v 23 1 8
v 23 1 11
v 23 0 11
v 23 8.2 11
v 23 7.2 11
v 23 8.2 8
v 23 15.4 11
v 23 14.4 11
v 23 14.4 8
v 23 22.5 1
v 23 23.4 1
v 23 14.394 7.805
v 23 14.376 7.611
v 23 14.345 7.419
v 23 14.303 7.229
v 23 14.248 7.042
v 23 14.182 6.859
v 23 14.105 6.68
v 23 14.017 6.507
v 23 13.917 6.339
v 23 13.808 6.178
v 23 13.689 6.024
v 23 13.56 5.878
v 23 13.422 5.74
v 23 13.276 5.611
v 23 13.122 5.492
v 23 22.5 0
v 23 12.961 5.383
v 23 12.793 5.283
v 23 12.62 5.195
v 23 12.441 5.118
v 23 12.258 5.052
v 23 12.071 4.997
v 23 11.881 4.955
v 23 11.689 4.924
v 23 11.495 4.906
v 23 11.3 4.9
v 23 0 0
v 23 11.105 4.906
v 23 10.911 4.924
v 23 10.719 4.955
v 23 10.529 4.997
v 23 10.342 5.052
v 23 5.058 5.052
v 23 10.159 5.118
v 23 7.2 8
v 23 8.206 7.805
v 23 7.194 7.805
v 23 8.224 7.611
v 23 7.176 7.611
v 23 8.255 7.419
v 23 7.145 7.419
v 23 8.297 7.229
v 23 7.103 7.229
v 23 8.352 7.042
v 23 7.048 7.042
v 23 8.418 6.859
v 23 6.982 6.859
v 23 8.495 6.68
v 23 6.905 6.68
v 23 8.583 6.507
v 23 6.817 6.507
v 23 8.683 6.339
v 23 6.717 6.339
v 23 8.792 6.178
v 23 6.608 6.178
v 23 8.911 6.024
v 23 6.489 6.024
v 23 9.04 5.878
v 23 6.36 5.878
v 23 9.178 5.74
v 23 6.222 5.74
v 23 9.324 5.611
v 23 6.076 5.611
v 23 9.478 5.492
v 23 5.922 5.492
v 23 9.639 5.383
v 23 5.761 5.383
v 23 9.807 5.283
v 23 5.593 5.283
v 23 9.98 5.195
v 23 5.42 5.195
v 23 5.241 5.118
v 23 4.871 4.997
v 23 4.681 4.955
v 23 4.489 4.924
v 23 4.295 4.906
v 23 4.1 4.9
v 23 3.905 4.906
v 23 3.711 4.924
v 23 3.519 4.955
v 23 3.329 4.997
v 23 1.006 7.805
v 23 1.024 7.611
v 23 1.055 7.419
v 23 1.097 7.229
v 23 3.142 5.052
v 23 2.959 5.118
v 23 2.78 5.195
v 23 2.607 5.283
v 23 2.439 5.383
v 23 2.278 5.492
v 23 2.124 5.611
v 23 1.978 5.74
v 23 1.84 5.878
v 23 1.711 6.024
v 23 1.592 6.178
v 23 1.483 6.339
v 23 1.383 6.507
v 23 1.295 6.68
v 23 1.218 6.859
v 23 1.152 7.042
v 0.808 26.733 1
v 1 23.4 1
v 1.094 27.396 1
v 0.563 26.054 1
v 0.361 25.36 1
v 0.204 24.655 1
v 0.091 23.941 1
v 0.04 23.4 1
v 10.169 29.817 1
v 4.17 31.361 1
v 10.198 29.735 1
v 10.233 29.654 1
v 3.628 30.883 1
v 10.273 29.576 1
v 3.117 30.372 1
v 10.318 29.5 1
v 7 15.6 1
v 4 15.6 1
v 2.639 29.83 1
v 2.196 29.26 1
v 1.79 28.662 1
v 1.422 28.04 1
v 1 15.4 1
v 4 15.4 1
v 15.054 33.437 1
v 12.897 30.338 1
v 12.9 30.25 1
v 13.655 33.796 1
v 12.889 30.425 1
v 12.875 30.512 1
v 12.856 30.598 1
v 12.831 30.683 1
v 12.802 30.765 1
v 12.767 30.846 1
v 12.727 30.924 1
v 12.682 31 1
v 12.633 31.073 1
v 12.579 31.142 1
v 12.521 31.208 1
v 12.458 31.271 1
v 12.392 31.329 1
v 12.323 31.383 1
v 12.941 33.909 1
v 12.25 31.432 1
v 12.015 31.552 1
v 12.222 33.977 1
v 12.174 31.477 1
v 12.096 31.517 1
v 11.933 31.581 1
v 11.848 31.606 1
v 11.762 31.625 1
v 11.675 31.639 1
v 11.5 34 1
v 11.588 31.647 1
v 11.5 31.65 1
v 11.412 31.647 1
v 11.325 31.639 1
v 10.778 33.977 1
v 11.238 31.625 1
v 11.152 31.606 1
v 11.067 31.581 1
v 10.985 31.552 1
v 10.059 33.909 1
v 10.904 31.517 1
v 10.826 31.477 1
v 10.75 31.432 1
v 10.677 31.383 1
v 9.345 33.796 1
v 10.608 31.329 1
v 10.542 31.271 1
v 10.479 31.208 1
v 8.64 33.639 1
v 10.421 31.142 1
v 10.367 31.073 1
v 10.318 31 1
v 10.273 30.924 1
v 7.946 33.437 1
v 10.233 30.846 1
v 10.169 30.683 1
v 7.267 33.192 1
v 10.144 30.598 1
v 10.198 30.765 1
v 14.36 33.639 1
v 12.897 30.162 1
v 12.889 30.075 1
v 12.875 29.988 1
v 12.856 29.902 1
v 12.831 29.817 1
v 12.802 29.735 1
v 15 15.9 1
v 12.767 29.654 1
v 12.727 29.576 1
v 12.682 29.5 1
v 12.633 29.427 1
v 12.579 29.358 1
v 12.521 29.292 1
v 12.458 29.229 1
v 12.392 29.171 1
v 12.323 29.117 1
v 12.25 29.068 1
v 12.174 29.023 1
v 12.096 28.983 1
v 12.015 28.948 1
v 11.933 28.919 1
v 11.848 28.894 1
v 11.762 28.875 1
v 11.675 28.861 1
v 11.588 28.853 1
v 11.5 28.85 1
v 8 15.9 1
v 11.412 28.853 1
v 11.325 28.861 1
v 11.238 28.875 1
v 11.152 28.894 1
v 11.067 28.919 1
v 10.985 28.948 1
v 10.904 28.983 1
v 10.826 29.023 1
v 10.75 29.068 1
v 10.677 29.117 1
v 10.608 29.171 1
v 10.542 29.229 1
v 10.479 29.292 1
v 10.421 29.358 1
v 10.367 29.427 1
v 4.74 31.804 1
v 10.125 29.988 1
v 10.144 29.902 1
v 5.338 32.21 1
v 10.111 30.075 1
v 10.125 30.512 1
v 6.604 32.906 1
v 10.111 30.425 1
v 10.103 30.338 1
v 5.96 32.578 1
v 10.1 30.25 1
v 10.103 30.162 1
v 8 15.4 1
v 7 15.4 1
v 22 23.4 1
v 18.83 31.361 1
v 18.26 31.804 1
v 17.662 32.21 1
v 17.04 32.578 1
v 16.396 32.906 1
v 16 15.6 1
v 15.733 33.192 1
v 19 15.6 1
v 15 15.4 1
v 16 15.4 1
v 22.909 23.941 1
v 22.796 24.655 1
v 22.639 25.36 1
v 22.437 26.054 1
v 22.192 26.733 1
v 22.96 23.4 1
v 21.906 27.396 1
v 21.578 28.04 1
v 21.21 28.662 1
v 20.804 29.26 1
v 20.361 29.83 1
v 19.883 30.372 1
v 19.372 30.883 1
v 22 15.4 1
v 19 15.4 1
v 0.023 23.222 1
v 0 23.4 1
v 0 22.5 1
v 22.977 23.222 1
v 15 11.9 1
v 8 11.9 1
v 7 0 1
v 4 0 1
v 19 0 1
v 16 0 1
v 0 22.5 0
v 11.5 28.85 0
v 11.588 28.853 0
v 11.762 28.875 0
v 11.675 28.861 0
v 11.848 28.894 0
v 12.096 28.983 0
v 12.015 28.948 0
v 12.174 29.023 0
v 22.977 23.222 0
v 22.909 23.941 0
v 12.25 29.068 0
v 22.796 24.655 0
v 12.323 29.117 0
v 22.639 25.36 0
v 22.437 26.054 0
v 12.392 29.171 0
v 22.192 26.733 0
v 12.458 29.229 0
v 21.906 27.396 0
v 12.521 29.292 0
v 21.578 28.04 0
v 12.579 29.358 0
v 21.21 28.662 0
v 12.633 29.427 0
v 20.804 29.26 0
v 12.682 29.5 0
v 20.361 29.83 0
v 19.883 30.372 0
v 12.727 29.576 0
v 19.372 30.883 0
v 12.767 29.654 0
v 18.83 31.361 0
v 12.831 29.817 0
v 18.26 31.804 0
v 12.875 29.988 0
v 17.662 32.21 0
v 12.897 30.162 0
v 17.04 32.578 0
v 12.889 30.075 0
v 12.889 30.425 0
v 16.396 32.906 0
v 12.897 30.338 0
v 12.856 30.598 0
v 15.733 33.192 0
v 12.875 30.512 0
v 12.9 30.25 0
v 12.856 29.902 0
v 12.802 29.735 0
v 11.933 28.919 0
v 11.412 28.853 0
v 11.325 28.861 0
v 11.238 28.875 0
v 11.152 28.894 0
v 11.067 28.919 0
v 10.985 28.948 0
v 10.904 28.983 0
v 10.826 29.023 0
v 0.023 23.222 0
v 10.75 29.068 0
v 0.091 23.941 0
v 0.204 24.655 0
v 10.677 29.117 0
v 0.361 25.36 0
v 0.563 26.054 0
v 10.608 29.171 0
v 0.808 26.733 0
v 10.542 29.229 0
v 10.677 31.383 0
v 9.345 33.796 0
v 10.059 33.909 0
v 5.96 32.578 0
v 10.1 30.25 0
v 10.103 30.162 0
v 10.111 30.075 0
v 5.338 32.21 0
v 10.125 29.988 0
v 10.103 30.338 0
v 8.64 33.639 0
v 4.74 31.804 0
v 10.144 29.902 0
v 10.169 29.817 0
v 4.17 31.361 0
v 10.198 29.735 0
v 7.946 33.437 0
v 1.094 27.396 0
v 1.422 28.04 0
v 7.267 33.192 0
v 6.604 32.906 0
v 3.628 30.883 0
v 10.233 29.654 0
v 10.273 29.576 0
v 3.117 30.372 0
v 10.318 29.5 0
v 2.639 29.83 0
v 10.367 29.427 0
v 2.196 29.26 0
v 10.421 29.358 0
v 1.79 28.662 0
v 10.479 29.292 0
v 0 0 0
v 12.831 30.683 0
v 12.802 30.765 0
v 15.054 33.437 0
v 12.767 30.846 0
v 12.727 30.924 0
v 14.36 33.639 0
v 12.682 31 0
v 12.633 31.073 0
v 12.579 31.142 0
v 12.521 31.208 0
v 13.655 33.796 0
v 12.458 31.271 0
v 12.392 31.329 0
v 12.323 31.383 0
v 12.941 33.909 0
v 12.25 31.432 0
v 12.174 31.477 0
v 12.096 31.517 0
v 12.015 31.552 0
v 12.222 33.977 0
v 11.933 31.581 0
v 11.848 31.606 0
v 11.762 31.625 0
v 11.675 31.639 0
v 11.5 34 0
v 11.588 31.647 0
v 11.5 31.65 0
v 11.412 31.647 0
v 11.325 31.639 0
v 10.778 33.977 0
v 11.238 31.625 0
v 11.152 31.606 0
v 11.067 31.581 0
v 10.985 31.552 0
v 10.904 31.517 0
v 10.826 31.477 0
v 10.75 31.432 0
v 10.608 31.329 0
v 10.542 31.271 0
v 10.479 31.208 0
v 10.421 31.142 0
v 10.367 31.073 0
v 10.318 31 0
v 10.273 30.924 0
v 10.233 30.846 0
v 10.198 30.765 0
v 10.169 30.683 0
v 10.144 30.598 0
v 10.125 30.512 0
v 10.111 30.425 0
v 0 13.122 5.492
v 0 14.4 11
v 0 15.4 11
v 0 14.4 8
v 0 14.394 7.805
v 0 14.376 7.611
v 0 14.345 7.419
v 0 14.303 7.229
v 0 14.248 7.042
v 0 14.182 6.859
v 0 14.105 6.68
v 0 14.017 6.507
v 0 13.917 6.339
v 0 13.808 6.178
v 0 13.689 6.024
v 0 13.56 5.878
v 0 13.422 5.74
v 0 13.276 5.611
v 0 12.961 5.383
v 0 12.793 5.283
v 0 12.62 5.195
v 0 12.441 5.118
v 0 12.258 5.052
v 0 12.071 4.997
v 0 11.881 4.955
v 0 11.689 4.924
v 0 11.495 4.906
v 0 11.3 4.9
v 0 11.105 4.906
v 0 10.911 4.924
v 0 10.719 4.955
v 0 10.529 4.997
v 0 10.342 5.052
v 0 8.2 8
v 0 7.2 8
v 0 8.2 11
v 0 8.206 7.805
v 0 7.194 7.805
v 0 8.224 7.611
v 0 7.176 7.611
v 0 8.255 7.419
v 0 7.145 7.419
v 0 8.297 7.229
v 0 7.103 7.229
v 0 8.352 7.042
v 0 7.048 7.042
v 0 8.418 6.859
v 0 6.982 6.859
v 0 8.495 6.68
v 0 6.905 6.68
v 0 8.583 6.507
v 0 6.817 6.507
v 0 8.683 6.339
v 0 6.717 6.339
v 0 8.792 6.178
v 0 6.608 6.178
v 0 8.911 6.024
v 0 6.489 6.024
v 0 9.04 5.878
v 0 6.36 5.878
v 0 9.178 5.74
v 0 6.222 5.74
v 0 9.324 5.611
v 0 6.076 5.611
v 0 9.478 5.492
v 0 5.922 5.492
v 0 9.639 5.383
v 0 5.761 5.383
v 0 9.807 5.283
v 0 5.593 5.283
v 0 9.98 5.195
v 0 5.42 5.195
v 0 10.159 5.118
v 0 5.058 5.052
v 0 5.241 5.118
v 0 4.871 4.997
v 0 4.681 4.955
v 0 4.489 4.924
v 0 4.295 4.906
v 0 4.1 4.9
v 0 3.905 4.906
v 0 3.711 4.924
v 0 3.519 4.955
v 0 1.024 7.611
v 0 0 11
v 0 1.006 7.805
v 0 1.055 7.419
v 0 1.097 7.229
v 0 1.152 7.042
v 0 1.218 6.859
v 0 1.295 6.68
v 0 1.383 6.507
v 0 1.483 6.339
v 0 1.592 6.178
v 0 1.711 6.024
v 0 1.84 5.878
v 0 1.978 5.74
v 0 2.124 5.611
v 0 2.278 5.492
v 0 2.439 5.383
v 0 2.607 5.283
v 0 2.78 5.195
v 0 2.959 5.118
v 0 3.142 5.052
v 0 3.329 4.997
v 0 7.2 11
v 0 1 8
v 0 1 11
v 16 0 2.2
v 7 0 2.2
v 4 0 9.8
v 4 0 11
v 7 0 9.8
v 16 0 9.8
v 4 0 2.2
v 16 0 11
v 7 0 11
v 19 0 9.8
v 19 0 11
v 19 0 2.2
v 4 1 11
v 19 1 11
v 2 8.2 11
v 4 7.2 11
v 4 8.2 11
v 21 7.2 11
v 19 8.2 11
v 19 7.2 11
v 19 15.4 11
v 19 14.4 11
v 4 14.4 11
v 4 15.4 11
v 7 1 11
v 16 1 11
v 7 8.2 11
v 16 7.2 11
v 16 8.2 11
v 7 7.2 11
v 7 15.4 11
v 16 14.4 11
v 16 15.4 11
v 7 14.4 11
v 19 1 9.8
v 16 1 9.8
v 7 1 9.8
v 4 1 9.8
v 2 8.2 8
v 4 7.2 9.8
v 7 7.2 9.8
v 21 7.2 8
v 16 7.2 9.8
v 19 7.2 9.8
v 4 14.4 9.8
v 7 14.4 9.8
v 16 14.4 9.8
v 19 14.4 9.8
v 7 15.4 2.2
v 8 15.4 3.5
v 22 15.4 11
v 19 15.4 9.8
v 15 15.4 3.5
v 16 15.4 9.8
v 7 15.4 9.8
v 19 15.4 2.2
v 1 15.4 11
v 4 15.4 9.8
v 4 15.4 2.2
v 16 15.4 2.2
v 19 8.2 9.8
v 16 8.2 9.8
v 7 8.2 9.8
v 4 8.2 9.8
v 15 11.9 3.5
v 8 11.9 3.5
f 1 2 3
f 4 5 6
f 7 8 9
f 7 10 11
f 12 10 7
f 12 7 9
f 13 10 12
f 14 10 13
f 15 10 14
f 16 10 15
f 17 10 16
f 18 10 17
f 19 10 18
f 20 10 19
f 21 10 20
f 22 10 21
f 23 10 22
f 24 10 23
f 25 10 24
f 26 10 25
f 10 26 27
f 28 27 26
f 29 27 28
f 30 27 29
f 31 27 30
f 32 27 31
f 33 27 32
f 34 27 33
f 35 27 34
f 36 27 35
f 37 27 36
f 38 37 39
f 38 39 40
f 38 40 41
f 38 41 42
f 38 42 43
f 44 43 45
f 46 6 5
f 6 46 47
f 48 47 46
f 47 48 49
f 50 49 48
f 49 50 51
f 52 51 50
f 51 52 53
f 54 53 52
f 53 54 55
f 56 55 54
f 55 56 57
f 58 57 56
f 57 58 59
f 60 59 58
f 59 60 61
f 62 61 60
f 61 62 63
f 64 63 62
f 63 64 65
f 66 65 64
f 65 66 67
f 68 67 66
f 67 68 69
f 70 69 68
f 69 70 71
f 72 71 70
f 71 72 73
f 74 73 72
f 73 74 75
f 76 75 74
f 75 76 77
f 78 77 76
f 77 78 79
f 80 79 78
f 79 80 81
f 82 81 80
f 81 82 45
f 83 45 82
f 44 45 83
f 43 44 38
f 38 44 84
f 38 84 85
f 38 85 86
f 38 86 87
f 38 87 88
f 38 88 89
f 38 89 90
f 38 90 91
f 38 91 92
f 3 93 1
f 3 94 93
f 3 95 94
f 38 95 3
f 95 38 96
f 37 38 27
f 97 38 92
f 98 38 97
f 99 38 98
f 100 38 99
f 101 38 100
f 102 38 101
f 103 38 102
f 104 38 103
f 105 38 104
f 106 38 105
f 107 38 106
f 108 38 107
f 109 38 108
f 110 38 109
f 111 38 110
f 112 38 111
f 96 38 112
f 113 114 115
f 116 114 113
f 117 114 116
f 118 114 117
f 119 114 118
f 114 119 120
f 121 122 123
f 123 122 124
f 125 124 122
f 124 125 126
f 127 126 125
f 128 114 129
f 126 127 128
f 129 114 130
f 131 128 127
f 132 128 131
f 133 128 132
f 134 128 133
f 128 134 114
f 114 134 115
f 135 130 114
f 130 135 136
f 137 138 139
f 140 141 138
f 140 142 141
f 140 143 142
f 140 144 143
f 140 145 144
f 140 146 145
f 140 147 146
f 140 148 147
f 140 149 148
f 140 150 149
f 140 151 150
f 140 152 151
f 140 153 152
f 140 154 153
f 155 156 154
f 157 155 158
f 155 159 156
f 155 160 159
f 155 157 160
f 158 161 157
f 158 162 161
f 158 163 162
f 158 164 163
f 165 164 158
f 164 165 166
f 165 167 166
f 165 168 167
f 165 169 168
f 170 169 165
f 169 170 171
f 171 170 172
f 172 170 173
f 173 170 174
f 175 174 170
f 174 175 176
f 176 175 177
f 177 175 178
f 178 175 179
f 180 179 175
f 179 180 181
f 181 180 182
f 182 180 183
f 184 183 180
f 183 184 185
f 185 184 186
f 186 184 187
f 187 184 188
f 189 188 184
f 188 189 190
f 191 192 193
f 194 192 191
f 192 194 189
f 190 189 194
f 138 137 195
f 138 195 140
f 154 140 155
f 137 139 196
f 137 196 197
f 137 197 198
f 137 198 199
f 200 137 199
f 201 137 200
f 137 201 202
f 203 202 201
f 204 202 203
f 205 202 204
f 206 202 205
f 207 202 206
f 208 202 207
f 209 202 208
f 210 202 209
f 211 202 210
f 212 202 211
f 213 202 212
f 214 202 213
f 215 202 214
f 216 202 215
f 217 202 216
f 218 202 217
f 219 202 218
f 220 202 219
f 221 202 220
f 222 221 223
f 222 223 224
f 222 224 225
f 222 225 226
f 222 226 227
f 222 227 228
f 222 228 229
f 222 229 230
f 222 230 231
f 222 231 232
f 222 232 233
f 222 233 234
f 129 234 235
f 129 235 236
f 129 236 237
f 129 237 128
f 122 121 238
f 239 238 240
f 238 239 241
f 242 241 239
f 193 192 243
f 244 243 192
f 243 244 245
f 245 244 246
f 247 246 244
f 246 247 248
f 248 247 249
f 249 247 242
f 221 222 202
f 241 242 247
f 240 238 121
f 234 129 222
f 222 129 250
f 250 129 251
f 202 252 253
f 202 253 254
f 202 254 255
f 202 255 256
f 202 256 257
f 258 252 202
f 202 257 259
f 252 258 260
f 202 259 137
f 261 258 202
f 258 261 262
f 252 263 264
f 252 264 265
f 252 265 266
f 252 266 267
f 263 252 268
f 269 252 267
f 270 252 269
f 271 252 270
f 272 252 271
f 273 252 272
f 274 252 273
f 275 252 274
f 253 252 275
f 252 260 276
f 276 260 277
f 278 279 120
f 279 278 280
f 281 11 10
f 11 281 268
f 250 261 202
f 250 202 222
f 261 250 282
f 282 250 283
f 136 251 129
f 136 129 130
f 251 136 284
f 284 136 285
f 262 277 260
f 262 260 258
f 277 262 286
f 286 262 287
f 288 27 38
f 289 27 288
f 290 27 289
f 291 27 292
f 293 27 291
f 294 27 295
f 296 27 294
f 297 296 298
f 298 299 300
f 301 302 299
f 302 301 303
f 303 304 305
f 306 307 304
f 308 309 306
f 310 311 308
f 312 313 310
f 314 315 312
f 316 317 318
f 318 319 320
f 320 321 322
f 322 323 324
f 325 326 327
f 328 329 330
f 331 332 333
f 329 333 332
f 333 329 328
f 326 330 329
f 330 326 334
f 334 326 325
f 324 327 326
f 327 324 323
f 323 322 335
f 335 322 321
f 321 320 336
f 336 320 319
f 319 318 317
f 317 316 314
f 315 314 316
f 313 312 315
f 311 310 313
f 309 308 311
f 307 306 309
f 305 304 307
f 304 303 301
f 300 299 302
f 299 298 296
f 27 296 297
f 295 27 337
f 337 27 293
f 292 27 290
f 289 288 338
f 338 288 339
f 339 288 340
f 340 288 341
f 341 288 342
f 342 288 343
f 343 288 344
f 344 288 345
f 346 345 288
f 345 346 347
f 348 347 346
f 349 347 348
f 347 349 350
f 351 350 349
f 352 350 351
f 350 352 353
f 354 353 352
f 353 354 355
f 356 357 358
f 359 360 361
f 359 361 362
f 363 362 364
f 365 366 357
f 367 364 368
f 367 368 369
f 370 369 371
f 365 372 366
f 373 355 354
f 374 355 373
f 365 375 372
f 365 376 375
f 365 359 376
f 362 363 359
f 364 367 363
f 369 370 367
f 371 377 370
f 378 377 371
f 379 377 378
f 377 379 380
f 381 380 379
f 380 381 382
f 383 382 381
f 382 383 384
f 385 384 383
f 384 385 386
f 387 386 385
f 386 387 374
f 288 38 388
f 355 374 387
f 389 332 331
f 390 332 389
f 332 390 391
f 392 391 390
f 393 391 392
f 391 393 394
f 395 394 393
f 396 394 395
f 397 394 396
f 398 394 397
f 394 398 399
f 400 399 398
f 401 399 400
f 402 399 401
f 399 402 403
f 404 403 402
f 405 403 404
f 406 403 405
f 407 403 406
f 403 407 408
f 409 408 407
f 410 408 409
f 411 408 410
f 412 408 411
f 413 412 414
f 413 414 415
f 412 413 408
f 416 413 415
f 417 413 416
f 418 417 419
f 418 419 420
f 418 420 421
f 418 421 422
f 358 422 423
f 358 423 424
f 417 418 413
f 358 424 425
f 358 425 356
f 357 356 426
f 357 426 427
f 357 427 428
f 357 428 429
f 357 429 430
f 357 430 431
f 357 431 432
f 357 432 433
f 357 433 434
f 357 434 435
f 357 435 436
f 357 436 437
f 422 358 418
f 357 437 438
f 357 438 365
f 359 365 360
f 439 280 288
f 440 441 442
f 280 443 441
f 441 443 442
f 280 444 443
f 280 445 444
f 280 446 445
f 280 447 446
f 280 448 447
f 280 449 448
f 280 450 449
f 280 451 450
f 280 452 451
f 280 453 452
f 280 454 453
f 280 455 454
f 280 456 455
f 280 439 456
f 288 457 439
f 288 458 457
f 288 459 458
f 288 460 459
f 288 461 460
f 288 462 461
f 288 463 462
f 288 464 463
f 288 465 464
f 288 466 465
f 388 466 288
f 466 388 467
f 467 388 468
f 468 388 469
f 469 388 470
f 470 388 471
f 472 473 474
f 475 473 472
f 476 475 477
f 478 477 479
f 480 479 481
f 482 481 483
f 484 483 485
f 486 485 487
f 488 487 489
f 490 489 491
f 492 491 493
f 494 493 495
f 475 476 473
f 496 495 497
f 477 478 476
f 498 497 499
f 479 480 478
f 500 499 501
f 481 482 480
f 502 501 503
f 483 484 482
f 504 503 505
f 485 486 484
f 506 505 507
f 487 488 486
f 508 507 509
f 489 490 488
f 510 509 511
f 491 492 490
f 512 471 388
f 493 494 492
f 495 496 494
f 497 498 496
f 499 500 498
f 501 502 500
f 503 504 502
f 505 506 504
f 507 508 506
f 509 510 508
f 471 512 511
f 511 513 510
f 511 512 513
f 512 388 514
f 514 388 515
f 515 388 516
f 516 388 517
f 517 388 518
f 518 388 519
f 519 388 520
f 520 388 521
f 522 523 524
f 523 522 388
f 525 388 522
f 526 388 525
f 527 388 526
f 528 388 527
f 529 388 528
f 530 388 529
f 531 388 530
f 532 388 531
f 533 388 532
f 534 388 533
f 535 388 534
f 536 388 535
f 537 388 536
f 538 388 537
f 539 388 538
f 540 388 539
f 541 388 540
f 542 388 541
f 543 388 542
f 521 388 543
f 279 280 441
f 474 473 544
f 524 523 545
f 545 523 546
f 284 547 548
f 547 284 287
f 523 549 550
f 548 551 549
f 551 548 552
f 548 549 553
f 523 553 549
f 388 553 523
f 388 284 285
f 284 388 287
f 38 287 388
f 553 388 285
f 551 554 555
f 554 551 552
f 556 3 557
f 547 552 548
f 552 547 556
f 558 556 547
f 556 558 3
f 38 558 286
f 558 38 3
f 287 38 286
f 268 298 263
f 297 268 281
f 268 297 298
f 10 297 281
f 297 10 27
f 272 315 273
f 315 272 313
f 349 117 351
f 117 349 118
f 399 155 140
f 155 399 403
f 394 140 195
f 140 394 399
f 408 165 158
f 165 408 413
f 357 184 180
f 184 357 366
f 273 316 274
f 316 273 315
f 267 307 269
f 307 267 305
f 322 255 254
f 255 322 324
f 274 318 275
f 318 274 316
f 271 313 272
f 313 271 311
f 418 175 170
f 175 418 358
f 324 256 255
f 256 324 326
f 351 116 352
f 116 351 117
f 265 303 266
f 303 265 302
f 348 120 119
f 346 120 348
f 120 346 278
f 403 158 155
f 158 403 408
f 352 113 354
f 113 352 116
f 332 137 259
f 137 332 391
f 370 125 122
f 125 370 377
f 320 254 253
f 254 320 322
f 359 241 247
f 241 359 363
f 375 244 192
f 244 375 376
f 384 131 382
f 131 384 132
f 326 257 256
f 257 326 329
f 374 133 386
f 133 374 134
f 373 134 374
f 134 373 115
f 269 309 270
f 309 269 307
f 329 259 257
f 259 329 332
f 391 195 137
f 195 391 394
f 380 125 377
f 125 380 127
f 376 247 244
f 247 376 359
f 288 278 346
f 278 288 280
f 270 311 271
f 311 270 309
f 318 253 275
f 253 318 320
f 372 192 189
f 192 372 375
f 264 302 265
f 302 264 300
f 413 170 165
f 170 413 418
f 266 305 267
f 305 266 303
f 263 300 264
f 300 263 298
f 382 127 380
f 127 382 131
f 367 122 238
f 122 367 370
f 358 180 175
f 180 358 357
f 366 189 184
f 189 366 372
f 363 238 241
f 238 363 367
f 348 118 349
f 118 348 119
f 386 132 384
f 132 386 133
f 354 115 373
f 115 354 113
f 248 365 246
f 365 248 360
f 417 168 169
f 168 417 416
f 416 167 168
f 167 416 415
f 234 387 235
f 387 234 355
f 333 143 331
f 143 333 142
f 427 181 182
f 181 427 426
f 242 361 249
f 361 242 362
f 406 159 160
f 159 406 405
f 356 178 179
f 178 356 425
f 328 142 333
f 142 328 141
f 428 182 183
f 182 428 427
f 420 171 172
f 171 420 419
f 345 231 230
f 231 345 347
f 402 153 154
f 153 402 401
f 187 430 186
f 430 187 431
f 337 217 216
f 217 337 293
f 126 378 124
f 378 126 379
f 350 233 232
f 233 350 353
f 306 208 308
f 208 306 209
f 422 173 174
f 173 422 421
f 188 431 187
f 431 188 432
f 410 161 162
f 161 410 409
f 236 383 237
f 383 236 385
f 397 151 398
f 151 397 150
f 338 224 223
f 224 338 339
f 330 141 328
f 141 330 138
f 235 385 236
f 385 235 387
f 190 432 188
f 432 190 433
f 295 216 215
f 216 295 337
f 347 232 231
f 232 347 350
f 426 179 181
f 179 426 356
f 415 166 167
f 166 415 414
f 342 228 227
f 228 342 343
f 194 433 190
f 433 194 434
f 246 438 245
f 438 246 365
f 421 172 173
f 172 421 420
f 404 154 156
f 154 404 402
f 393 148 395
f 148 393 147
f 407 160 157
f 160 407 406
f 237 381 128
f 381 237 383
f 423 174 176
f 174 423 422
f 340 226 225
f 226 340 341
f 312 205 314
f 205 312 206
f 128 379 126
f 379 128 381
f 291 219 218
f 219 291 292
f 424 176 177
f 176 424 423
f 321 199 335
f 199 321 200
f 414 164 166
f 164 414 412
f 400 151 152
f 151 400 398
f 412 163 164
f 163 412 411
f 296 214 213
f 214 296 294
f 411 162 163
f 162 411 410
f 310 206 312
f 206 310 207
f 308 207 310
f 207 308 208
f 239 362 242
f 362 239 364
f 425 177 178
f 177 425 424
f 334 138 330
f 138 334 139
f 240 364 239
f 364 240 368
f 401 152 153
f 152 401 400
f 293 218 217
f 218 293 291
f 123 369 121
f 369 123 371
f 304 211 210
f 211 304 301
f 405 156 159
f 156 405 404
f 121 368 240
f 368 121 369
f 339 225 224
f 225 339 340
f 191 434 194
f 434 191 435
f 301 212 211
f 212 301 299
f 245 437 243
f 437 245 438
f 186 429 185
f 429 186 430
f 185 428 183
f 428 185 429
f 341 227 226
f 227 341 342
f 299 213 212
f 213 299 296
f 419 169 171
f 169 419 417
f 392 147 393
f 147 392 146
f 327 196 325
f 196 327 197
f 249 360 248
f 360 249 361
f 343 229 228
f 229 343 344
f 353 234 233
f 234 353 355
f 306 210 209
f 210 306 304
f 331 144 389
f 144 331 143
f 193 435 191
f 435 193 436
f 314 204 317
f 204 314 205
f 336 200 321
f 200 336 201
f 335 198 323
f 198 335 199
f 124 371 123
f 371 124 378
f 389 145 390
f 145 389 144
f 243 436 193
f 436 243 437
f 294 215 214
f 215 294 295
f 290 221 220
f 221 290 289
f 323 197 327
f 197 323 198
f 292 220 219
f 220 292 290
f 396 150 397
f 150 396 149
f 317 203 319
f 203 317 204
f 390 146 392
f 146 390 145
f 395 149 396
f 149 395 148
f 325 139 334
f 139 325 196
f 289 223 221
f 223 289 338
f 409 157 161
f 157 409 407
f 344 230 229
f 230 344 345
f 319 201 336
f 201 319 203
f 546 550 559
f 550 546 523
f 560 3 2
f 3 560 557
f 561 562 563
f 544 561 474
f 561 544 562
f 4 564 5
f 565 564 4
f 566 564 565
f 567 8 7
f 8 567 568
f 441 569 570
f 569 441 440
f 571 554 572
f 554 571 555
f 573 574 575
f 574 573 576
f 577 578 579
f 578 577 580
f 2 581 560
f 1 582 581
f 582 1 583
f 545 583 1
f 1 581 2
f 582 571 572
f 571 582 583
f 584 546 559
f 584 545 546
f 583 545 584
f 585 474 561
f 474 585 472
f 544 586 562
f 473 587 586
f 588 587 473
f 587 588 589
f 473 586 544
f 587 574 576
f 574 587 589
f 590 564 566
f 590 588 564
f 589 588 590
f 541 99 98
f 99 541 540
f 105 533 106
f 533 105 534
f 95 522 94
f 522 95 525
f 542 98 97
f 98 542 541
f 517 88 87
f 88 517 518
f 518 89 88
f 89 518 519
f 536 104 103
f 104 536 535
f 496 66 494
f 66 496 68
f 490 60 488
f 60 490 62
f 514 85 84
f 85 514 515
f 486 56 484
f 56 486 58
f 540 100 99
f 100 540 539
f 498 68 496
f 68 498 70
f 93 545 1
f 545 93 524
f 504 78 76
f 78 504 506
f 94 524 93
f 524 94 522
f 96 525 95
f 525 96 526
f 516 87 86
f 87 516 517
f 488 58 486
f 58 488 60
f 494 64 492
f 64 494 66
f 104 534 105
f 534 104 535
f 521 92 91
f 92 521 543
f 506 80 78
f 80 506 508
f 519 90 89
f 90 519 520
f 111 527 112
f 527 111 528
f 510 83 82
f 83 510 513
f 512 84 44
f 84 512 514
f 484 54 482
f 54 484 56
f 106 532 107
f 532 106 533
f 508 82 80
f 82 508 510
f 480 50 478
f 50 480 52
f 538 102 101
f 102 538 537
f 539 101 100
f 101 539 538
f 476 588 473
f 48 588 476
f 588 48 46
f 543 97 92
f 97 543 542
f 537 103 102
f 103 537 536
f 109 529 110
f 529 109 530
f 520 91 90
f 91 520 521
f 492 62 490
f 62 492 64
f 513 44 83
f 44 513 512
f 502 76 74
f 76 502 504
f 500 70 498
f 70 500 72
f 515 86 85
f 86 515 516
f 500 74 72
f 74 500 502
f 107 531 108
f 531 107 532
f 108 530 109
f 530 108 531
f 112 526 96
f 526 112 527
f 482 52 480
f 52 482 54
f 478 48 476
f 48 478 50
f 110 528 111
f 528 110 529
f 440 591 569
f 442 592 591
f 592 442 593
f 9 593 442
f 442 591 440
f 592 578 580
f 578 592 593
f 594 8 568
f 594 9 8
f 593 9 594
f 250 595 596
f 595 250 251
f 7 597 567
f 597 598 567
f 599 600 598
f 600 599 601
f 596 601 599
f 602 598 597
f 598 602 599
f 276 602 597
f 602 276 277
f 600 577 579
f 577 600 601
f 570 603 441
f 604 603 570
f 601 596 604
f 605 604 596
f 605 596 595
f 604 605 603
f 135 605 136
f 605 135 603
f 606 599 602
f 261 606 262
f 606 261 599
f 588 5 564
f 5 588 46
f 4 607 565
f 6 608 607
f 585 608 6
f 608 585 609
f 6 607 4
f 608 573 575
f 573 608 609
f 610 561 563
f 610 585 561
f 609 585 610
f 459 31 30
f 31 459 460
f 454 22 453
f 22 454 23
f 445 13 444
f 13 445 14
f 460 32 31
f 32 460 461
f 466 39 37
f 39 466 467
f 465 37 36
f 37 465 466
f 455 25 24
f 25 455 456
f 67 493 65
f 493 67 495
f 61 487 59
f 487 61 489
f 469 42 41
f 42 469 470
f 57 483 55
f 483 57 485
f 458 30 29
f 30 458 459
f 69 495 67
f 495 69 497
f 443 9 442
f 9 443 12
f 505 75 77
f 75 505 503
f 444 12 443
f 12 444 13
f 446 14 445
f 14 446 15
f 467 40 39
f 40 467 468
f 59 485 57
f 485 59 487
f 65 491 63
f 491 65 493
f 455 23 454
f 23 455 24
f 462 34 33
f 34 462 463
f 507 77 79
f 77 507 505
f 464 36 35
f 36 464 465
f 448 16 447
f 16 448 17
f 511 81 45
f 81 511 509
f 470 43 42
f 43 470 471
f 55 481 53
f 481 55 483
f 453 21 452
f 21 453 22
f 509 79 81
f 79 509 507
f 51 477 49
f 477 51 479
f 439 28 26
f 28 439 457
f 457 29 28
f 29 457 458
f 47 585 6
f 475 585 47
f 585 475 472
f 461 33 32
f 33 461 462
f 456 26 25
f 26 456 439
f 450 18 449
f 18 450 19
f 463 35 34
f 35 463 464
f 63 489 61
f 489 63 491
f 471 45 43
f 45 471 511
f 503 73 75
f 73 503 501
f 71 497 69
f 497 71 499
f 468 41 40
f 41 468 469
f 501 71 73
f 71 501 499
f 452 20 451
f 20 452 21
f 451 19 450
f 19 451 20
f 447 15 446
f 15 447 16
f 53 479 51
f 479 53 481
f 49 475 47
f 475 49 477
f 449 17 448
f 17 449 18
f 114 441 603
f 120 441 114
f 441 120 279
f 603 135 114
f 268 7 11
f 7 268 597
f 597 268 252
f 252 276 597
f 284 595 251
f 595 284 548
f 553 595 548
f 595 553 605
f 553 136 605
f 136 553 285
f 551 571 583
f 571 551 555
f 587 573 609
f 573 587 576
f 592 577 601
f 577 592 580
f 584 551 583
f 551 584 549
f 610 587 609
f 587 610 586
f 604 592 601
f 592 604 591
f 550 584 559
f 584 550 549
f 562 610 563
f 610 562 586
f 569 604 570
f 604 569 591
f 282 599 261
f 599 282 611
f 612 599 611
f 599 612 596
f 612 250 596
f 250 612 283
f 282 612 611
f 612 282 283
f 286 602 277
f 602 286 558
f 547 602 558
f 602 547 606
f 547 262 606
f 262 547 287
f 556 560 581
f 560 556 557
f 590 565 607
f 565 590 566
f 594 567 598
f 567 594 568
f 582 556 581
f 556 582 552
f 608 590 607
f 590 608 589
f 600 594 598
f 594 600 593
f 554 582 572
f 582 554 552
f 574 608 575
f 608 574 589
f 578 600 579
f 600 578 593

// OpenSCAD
module show_wheels(){
    translate([0,7,8]){
        rotate([0,90,0]){
            cylinder(h = 5, r1 = 7, r2 = 7, $fn = 100);
        }
    }
}

module mirror(wt, mw){

    // holder walls
    translate([0,0,7+wt]){
        cube(size = [mw+4, wt, 3]);
        translate([0, 6.2+wt, 0]){
            cube(size = [21, wt, 3]);
        }
    }

    // motor holder right
    difference(){
        cube(size = [mw+4, 6.2+2*wt, 7+wt]);
        // motor
        translate([0,3.1+wt,7+wt]){
            rotate([0,90,0]){
                cylinder(h = 19+4, r1 = 3.1, r2 = 3.1, $fn = 100);
            }
        }
    }
}

module main(wt, mw){

    bh = 23;
    rb = 0.5*25*0.58;
    rh = 1.4; //0.5*25*(0.09);
    // base
    difference(){
        union(){
            cube(size = [mw+4, bh-0.5, wt]);
            translate([0.5*(mw+4), bh-0.5, 0]){
                 cylinder(h = wt, r1 = 0.5*bh, r2 = 0.5*bh, $fn = 100);
            }
        }
        translate([((mw+4)/2), 23, 0]){
            rotate([0,0,90]){
                translate([rb, 0, 0]){
                    cylinder(h = 1, r1 = rh, r2 = rh, $fn = 100);
                }
                /*translate([-rb, 0, 0]){
                    cylinder(h = 2, r1 = rh, r2 = rh, $fn = 100);
                }*/
            }
        }
    }

    mirror(wt, mw);

    rotate([0,0,180]){
        translate([-(mw+4),-2*(6.2)-3*wt,0]){
            mirror(wt, mw);
        }
    }
    l = 1;
    w = 8;
    h = 10;
    
    translate([wt, 2*6.2+3*wt+8, wt]){
        //Start with an extruded triangle
        rotate(a=[0,0,180]){
            polyhedron(
               points=[[0,0,0], [l,0,0], [l,w,0], [0,w,0], [0,w,h], [l,w,h]],
               faces=[[0,1,2,3],[5,4,3,2],[0,4,5,1],[0,3,4],[5,2,1]]
               );
        }
    }
    translate([23, 2*6.2+3*wt+8, wt]){
        //Start with an extruded triangle
        rotate(a=[0,0,180]){
        polyhedron(
               points=[[0,0,0], [l,0,0], [l,w,0], [0,w,0], [0,w,h], [l,w,h]],
               faces=[[0,1,2,3],[5,4,3,2],[0,4,5,1],[0,3,4],[5,2,1]]
               );
        }
    }
    
}

module caster(){
    
rb = 0.5*25*0.58;
re = 0.5*25*(0.8-0.53);
rh = 0.5*25*(0.09);
h1 = 0.03*25;

rball = 0.5*25*0.5;

    difference(){
        union(){
            cylinder(h = h1, r1 = rb, r2 = rb, $fn = 100);

            translate([rb, 0, 0]){
                cylinder(h = h1, r1 = re, r2 = re, $fn = 100);
            }

            translate([-rb, 0, 0]){
                cylinder(h = h1, r1 = re, r2 = re, $fn = 100);
            }
        }
        union(){
            translate([rb, 0, 0]){
                cylinder(h = h1, r1 = rh, r2 = rh, $fn = 100);
            }
            translate([-rb, 0, 0]){
                cylinder(h = h1, r1 = rh, r2 = rh, $fn = 100);
            }
        }
    }

    translate([0,0,h1+rball]){
        sphere(rball, $fn=100);
    }
}

module tie_hole (x, w){
    union(){
        translate([x-w,0,1]){
            cube(size = [2*w, 2*6.3+3*1.0, 1.2]);
        }
        translate([x-w,0,11-1.2]){
            cube(size = [2*w, 2*6.3+3*1.0, 1.2]);
        }
        //remove 
        translate([(23-7)/2,(2*6.2+3*1)-3.5,1]){
            cube(size = [7, 4, 2.5]);
        }
    } 
}

module show_parts(){
    show_wheels();
    translate([28,6.2+1.0,0]){
        show_wheels();
    }

    translate([5,3.1,0]){
        mw = 19;
        difference(){
            main(1.0, mw);
            tie_hole(6, 1.5);
            tie_hole(23-6, 1.5);
        }
        translate([((mw+4)/2), 23, 1]){
            rotate([0,0,90]){
                caster();
            }
        }
    }
}
//show_parts();


difference(){
    main(1.0, 19);
    tie_hole(5.5, 1.5);
    tie_hole(23-5.5, 1.5);
    
}
